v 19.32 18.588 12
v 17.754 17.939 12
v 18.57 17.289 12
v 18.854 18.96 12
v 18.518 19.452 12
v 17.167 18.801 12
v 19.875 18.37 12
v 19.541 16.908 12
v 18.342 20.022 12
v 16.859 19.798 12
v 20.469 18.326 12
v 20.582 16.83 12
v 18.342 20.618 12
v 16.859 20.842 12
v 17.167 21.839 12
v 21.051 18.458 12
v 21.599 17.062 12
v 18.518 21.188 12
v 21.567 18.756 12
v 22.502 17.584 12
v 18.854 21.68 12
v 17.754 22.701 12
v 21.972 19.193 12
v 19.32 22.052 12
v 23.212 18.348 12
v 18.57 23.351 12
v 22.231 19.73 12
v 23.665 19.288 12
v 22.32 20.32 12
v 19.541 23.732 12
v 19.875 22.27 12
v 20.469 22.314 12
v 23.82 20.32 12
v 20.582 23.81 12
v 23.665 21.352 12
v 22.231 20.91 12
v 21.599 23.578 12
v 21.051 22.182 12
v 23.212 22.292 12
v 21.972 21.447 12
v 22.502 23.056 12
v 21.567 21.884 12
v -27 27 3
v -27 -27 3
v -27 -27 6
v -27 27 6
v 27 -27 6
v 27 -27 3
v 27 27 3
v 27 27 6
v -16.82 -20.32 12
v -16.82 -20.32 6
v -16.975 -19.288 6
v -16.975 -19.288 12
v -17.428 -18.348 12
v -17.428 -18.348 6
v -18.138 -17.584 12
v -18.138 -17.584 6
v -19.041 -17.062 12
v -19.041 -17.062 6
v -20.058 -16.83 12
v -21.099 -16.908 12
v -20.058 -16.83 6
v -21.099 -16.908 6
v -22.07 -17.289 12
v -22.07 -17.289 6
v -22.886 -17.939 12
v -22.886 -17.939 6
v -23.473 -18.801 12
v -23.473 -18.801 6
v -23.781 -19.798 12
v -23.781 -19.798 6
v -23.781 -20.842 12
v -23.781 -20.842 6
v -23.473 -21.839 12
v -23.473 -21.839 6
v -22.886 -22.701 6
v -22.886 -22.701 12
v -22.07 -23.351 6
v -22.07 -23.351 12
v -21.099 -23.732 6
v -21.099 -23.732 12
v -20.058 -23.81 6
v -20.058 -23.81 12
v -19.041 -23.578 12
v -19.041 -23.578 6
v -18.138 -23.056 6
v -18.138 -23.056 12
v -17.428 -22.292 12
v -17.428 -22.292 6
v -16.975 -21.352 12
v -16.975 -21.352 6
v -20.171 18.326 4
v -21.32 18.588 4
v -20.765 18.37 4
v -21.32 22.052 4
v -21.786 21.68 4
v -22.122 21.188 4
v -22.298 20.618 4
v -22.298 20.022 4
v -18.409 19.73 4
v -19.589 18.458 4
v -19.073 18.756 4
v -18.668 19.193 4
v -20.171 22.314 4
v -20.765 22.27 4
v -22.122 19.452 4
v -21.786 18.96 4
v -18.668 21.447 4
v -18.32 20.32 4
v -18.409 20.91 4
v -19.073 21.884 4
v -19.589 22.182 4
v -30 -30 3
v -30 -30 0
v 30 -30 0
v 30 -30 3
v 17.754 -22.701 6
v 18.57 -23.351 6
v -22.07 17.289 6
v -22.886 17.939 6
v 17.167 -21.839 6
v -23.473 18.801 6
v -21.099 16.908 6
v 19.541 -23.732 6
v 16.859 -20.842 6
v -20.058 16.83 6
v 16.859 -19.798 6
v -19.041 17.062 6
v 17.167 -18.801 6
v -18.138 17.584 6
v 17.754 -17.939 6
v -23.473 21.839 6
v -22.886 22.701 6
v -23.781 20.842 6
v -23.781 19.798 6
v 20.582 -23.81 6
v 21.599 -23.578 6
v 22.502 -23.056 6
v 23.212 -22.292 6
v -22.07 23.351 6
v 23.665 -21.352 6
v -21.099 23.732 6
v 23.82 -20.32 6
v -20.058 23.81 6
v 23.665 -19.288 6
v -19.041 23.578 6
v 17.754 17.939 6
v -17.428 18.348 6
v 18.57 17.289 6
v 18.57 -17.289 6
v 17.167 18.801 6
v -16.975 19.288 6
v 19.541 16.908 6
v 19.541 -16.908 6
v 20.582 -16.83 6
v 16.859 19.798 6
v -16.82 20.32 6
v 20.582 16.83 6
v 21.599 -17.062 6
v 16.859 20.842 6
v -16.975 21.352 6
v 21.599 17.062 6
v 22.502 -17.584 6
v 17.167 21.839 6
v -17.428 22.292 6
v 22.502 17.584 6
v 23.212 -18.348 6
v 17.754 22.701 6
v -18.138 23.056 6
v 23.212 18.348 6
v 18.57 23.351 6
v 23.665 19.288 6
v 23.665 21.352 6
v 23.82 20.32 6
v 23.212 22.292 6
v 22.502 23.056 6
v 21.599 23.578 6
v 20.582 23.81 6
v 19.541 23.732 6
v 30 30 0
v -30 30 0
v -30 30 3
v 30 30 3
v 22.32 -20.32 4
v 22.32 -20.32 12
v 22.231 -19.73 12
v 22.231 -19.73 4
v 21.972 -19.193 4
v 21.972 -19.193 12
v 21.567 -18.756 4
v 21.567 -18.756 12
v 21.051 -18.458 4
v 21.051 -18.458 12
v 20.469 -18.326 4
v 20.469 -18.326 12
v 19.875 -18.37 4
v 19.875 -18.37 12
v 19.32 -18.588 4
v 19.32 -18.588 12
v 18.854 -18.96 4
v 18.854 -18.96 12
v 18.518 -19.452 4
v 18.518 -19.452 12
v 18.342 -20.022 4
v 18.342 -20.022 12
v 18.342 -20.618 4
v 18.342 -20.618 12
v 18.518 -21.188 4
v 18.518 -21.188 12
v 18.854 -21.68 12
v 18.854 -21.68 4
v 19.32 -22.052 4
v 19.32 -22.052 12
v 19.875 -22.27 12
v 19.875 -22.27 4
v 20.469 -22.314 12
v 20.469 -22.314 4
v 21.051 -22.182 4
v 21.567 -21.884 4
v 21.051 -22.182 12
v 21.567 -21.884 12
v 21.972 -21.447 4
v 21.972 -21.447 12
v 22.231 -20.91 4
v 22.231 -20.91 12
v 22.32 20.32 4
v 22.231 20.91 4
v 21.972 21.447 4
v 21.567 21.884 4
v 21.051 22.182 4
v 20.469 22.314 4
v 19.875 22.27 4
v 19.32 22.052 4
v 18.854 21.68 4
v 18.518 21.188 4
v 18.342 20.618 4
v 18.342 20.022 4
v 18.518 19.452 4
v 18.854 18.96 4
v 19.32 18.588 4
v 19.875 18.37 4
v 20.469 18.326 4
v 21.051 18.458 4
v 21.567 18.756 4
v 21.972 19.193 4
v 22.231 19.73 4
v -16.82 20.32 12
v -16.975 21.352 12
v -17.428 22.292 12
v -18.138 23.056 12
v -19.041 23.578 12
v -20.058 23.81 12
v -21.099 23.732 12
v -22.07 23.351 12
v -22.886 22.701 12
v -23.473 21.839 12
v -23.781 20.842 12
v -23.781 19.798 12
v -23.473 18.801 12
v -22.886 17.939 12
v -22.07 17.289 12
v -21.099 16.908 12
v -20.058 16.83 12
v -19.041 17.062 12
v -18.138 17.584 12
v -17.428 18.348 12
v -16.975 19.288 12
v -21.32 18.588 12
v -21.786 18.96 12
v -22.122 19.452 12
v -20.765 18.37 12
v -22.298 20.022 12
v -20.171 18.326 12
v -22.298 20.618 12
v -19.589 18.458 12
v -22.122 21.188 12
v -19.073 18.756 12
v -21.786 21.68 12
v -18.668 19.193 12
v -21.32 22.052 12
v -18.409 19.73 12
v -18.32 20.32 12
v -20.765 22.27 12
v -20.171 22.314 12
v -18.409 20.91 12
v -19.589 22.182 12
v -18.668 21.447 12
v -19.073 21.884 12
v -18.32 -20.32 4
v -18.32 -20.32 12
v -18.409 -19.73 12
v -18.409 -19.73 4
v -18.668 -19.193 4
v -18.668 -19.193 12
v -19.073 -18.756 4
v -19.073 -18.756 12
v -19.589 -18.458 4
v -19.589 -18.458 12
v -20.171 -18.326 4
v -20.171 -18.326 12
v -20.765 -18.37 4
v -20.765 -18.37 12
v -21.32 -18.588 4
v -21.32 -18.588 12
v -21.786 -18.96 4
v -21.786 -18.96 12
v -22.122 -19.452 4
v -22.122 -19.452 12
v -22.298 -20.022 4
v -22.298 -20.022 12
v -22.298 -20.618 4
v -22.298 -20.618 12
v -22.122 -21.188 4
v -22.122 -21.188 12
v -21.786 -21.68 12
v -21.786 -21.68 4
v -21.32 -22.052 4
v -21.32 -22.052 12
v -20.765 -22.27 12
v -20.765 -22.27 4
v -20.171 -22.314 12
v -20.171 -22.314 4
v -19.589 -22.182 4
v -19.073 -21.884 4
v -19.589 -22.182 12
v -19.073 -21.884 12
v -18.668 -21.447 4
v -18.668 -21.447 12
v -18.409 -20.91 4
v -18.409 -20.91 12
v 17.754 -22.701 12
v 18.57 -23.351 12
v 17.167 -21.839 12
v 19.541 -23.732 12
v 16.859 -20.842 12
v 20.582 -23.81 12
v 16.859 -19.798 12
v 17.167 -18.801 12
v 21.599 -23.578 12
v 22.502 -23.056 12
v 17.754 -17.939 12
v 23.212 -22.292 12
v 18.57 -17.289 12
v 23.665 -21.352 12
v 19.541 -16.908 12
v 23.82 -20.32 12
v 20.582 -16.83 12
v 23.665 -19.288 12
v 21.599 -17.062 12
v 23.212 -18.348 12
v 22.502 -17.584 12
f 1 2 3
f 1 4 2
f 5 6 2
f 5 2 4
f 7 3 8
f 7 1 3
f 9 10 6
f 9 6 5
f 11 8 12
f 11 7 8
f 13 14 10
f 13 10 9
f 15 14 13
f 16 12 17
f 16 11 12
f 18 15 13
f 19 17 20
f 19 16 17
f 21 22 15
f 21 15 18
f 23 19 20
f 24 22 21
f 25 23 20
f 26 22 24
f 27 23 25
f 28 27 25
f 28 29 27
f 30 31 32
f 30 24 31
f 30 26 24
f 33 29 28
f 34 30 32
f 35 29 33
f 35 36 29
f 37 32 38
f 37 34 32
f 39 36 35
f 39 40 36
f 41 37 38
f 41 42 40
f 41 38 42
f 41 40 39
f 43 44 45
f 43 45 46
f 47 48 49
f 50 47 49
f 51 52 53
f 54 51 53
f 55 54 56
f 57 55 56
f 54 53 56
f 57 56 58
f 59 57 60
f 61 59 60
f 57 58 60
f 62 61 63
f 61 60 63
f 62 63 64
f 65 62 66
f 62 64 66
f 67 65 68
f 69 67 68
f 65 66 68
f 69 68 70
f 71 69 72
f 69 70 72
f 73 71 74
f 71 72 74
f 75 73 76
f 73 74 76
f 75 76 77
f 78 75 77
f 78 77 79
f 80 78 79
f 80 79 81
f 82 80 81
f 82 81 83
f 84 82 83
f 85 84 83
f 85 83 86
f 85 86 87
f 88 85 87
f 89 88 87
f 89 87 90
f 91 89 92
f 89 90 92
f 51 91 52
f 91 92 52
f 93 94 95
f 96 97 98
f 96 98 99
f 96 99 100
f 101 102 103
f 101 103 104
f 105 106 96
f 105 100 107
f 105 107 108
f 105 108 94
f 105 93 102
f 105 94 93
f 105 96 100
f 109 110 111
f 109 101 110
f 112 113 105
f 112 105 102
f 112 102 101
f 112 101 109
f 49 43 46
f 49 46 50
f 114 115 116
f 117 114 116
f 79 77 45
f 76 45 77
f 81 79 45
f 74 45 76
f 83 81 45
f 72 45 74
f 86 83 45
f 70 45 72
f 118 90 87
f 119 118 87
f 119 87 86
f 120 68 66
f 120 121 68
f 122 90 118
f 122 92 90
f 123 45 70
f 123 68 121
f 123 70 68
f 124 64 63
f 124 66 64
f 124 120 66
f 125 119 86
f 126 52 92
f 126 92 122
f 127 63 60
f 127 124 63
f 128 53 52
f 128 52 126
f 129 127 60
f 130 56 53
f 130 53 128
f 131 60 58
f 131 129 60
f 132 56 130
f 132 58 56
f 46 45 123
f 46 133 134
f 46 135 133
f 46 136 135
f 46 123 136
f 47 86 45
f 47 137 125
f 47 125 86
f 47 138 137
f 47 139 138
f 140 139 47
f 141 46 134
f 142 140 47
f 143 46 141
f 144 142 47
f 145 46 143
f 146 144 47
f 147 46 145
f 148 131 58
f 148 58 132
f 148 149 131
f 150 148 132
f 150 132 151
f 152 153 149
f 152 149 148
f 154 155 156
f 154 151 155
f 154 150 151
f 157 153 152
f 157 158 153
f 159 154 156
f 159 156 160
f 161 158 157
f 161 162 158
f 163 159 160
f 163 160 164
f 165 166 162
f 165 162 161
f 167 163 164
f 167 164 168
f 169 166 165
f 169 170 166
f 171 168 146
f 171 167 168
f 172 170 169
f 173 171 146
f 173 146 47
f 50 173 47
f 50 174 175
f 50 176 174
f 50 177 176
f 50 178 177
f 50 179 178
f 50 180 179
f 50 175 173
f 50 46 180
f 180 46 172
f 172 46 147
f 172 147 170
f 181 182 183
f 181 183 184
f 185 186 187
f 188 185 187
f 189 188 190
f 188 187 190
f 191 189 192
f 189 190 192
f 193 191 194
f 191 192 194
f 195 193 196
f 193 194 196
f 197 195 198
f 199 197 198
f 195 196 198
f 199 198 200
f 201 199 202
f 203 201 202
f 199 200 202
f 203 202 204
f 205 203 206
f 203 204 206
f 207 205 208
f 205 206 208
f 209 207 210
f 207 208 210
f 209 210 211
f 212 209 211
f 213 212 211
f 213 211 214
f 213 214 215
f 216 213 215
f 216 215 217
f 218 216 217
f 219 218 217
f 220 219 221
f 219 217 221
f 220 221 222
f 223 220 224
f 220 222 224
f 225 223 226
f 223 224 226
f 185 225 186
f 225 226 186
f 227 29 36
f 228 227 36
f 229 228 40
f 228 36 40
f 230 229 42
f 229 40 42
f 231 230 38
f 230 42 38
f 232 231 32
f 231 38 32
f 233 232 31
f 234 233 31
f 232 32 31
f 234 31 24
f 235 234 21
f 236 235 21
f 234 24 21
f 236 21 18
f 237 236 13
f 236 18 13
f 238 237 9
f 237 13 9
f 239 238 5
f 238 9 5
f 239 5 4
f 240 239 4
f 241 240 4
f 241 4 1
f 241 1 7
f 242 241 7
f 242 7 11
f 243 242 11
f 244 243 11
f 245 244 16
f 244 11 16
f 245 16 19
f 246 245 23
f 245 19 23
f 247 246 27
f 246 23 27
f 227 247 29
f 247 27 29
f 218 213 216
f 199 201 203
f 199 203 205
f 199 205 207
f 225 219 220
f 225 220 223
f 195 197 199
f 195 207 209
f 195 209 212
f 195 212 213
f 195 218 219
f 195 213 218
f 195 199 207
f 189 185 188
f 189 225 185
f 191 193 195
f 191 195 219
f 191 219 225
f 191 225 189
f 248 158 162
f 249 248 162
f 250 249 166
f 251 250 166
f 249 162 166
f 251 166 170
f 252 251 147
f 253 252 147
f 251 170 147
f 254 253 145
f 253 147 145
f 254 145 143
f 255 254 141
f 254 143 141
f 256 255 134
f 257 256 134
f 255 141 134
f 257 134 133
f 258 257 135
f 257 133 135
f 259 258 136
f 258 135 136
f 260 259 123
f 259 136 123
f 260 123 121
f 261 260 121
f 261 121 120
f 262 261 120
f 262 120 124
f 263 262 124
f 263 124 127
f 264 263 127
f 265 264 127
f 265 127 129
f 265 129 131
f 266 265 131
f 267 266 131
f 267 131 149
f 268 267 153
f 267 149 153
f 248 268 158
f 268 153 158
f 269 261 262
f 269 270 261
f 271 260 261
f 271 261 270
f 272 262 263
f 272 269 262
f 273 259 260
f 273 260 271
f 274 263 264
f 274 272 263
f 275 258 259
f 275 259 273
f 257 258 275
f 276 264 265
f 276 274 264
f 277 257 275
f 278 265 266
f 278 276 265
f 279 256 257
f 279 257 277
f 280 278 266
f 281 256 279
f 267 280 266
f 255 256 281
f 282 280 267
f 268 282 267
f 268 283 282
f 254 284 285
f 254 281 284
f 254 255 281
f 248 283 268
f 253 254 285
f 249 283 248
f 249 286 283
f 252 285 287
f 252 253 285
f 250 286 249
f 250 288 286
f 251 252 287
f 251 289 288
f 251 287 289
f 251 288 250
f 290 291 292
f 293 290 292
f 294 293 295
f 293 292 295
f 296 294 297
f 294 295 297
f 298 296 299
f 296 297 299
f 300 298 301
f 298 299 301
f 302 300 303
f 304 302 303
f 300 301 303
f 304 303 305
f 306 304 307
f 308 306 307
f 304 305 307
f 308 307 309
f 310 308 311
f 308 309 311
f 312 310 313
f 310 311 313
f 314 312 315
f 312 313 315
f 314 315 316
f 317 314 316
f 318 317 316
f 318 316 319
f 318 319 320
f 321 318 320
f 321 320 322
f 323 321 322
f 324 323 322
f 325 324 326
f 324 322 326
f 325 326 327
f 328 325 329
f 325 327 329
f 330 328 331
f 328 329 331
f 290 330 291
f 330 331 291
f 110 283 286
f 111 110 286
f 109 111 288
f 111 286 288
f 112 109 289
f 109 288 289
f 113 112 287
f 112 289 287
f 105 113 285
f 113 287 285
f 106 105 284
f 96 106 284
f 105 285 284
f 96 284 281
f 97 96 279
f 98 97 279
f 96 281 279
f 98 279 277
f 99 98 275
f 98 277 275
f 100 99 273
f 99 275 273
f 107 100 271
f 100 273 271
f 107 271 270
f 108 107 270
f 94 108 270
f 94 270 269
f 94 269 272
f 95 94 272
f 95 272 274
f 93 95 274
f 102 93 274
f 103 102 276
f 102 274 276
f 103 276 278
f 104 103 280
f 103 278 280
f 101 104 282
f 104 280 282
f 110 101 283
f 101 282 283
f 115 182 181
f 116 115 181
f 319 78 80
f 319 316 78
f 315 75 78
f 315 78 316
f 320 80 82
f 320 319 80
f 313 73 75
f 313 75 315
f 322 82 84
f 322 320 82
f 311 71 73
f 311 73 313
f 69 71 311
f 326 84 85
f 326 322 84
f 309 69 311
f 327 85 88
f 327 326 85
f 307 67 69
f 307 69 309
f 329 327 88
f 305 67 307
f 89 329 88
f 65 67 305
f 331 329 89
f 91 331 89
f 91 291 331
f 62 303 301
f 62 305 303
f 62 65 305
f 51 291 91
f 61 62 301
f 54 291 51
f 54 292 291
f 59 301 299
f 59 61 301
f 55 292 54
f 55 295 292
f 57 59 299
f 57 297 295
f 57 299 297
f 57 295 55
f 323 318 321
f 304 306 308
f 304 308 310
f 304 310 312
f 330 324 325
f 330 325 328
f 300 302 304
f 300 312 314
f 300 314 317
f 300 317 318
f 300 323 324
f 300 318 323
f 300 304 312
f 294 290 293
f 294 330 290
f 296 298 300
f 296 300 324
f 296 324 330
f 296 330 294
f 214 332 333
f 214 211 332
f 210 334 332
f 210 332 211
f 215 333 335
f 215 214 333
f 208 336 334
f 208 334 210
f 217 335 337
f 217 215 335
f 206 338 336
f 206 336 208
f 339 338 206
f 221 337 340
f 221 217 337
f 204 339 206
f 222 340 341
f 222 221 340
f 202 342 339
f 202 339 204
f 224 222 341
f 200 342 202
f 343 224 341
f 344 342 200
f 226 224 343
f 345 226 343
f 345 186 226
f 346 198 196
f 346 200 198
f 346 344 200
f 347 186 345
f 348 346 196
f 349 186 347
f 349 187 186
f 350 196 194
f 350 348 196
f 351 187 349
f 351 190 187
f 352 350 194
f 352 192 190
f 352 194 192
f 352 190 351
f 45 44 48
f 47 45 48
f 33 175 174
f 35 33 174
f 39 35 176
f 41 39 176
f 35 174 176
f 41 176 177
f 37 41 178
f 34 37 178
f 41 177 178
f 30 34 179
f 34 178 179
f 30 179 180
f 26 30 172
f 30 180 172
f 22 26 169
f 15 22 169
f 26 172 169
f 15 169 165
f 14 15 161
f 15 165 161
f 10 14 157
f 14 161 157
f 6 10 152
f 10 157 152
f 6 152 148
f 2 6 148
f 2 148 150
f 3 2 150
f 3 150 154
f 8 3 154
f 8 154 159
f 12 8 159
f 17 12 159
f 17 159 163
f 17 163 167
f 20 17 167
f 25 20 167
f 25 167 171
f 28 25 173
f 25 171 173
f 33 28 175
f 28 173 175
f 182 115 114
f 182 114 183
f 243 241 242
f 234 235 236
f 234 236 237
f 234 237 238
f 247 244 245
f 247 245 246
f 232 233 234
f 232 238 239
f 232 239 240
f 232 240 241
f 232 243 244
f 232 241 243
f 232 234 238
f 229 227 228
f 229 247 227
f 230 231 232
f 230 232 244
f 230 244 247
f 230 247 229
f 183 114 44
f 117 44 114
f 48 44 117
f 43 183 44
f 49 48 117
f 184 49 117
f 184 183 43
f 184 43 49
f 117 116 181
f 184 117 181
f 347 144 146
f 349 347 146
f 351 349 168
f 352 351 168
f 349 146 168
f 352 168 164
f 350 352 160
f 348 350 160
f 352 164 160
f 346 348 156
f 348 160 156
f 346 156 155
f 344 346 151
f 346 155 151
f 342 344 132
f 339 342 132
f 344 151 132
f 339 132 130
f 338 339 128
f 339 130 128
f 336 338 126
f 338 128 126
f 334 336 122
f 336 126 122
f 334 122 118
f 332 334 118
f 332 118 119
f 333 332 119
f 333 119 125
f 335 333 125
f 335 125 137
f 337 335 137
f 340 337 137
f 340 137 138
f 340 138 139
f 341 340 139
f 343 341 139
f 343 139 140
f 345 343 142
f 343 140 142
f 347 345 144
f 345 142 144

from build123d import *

# Parameters (mm, degrees)
SKETCH_W     = 60
SKETCH_H     = 60
PAD_DEPTH    = 3
SKETCH001_W  = 54
SKETCH001_H  = 54
PAD001_DEPTH = 3
SKETCH002_R  = 3.5
PAD002_DEPTH = 6
SKETCH003_R  = 2
POCKET_DEPTH = 8


with BuildPart() as part:
    # Sketch → Pad (new body)
    with BuildSketch(Plane.XY):
        Rectangle(SKETCH_W, SKETCH_H)
    extrude(amount=PAD_DEPTH)

    # Sketch001 (on Face6 of Pad) → Pad001 (join)
    with BuildSketch(Plane.XY.offset(3)):
        Rectangle(SKETCH001_W, SKETCH001_H)
    extrude(amount=PAD001_DEPTH)

    # Sketch002 (on Face11 of Pad001) → Pad002 (join)
    with BuildSketch(Plane.XY.offset(6)):
        with Locations((-20.32, 20.32)):
            Circle(SKETCH002_R)
        with Locations((20.32, 20.32)):
            Circle(SKETCH002_R)
        with Locations((20.32, -20.32)):
            Circle(SKETCH002_R)
        with Locations((-20.32, -20.32)):
            Circle(SKETCH002_R)
    extrude(amount=PAD002_DEPTH)

    # Sketch003 (on Face19 of Pad002) → Pocket (cut)
    with BuildSketch(Plane.XY.offset(12)):
        with Locations((-20.32, 20.32)):
            Circle(SKETCH003_R)
        with Locations((20.32, 20.32)):
            Circle(SKETCH003_R)
        with Locations((20.32, -20.32)):
            Circle(SKETCH003_R)
        with Locations((-20.32, -20.32)):
            Circle(SKETCH003_R)
    extrude(amount=-POCKET_DEPTH, mode=Mode.SUBTRACT)


solid = part.part
